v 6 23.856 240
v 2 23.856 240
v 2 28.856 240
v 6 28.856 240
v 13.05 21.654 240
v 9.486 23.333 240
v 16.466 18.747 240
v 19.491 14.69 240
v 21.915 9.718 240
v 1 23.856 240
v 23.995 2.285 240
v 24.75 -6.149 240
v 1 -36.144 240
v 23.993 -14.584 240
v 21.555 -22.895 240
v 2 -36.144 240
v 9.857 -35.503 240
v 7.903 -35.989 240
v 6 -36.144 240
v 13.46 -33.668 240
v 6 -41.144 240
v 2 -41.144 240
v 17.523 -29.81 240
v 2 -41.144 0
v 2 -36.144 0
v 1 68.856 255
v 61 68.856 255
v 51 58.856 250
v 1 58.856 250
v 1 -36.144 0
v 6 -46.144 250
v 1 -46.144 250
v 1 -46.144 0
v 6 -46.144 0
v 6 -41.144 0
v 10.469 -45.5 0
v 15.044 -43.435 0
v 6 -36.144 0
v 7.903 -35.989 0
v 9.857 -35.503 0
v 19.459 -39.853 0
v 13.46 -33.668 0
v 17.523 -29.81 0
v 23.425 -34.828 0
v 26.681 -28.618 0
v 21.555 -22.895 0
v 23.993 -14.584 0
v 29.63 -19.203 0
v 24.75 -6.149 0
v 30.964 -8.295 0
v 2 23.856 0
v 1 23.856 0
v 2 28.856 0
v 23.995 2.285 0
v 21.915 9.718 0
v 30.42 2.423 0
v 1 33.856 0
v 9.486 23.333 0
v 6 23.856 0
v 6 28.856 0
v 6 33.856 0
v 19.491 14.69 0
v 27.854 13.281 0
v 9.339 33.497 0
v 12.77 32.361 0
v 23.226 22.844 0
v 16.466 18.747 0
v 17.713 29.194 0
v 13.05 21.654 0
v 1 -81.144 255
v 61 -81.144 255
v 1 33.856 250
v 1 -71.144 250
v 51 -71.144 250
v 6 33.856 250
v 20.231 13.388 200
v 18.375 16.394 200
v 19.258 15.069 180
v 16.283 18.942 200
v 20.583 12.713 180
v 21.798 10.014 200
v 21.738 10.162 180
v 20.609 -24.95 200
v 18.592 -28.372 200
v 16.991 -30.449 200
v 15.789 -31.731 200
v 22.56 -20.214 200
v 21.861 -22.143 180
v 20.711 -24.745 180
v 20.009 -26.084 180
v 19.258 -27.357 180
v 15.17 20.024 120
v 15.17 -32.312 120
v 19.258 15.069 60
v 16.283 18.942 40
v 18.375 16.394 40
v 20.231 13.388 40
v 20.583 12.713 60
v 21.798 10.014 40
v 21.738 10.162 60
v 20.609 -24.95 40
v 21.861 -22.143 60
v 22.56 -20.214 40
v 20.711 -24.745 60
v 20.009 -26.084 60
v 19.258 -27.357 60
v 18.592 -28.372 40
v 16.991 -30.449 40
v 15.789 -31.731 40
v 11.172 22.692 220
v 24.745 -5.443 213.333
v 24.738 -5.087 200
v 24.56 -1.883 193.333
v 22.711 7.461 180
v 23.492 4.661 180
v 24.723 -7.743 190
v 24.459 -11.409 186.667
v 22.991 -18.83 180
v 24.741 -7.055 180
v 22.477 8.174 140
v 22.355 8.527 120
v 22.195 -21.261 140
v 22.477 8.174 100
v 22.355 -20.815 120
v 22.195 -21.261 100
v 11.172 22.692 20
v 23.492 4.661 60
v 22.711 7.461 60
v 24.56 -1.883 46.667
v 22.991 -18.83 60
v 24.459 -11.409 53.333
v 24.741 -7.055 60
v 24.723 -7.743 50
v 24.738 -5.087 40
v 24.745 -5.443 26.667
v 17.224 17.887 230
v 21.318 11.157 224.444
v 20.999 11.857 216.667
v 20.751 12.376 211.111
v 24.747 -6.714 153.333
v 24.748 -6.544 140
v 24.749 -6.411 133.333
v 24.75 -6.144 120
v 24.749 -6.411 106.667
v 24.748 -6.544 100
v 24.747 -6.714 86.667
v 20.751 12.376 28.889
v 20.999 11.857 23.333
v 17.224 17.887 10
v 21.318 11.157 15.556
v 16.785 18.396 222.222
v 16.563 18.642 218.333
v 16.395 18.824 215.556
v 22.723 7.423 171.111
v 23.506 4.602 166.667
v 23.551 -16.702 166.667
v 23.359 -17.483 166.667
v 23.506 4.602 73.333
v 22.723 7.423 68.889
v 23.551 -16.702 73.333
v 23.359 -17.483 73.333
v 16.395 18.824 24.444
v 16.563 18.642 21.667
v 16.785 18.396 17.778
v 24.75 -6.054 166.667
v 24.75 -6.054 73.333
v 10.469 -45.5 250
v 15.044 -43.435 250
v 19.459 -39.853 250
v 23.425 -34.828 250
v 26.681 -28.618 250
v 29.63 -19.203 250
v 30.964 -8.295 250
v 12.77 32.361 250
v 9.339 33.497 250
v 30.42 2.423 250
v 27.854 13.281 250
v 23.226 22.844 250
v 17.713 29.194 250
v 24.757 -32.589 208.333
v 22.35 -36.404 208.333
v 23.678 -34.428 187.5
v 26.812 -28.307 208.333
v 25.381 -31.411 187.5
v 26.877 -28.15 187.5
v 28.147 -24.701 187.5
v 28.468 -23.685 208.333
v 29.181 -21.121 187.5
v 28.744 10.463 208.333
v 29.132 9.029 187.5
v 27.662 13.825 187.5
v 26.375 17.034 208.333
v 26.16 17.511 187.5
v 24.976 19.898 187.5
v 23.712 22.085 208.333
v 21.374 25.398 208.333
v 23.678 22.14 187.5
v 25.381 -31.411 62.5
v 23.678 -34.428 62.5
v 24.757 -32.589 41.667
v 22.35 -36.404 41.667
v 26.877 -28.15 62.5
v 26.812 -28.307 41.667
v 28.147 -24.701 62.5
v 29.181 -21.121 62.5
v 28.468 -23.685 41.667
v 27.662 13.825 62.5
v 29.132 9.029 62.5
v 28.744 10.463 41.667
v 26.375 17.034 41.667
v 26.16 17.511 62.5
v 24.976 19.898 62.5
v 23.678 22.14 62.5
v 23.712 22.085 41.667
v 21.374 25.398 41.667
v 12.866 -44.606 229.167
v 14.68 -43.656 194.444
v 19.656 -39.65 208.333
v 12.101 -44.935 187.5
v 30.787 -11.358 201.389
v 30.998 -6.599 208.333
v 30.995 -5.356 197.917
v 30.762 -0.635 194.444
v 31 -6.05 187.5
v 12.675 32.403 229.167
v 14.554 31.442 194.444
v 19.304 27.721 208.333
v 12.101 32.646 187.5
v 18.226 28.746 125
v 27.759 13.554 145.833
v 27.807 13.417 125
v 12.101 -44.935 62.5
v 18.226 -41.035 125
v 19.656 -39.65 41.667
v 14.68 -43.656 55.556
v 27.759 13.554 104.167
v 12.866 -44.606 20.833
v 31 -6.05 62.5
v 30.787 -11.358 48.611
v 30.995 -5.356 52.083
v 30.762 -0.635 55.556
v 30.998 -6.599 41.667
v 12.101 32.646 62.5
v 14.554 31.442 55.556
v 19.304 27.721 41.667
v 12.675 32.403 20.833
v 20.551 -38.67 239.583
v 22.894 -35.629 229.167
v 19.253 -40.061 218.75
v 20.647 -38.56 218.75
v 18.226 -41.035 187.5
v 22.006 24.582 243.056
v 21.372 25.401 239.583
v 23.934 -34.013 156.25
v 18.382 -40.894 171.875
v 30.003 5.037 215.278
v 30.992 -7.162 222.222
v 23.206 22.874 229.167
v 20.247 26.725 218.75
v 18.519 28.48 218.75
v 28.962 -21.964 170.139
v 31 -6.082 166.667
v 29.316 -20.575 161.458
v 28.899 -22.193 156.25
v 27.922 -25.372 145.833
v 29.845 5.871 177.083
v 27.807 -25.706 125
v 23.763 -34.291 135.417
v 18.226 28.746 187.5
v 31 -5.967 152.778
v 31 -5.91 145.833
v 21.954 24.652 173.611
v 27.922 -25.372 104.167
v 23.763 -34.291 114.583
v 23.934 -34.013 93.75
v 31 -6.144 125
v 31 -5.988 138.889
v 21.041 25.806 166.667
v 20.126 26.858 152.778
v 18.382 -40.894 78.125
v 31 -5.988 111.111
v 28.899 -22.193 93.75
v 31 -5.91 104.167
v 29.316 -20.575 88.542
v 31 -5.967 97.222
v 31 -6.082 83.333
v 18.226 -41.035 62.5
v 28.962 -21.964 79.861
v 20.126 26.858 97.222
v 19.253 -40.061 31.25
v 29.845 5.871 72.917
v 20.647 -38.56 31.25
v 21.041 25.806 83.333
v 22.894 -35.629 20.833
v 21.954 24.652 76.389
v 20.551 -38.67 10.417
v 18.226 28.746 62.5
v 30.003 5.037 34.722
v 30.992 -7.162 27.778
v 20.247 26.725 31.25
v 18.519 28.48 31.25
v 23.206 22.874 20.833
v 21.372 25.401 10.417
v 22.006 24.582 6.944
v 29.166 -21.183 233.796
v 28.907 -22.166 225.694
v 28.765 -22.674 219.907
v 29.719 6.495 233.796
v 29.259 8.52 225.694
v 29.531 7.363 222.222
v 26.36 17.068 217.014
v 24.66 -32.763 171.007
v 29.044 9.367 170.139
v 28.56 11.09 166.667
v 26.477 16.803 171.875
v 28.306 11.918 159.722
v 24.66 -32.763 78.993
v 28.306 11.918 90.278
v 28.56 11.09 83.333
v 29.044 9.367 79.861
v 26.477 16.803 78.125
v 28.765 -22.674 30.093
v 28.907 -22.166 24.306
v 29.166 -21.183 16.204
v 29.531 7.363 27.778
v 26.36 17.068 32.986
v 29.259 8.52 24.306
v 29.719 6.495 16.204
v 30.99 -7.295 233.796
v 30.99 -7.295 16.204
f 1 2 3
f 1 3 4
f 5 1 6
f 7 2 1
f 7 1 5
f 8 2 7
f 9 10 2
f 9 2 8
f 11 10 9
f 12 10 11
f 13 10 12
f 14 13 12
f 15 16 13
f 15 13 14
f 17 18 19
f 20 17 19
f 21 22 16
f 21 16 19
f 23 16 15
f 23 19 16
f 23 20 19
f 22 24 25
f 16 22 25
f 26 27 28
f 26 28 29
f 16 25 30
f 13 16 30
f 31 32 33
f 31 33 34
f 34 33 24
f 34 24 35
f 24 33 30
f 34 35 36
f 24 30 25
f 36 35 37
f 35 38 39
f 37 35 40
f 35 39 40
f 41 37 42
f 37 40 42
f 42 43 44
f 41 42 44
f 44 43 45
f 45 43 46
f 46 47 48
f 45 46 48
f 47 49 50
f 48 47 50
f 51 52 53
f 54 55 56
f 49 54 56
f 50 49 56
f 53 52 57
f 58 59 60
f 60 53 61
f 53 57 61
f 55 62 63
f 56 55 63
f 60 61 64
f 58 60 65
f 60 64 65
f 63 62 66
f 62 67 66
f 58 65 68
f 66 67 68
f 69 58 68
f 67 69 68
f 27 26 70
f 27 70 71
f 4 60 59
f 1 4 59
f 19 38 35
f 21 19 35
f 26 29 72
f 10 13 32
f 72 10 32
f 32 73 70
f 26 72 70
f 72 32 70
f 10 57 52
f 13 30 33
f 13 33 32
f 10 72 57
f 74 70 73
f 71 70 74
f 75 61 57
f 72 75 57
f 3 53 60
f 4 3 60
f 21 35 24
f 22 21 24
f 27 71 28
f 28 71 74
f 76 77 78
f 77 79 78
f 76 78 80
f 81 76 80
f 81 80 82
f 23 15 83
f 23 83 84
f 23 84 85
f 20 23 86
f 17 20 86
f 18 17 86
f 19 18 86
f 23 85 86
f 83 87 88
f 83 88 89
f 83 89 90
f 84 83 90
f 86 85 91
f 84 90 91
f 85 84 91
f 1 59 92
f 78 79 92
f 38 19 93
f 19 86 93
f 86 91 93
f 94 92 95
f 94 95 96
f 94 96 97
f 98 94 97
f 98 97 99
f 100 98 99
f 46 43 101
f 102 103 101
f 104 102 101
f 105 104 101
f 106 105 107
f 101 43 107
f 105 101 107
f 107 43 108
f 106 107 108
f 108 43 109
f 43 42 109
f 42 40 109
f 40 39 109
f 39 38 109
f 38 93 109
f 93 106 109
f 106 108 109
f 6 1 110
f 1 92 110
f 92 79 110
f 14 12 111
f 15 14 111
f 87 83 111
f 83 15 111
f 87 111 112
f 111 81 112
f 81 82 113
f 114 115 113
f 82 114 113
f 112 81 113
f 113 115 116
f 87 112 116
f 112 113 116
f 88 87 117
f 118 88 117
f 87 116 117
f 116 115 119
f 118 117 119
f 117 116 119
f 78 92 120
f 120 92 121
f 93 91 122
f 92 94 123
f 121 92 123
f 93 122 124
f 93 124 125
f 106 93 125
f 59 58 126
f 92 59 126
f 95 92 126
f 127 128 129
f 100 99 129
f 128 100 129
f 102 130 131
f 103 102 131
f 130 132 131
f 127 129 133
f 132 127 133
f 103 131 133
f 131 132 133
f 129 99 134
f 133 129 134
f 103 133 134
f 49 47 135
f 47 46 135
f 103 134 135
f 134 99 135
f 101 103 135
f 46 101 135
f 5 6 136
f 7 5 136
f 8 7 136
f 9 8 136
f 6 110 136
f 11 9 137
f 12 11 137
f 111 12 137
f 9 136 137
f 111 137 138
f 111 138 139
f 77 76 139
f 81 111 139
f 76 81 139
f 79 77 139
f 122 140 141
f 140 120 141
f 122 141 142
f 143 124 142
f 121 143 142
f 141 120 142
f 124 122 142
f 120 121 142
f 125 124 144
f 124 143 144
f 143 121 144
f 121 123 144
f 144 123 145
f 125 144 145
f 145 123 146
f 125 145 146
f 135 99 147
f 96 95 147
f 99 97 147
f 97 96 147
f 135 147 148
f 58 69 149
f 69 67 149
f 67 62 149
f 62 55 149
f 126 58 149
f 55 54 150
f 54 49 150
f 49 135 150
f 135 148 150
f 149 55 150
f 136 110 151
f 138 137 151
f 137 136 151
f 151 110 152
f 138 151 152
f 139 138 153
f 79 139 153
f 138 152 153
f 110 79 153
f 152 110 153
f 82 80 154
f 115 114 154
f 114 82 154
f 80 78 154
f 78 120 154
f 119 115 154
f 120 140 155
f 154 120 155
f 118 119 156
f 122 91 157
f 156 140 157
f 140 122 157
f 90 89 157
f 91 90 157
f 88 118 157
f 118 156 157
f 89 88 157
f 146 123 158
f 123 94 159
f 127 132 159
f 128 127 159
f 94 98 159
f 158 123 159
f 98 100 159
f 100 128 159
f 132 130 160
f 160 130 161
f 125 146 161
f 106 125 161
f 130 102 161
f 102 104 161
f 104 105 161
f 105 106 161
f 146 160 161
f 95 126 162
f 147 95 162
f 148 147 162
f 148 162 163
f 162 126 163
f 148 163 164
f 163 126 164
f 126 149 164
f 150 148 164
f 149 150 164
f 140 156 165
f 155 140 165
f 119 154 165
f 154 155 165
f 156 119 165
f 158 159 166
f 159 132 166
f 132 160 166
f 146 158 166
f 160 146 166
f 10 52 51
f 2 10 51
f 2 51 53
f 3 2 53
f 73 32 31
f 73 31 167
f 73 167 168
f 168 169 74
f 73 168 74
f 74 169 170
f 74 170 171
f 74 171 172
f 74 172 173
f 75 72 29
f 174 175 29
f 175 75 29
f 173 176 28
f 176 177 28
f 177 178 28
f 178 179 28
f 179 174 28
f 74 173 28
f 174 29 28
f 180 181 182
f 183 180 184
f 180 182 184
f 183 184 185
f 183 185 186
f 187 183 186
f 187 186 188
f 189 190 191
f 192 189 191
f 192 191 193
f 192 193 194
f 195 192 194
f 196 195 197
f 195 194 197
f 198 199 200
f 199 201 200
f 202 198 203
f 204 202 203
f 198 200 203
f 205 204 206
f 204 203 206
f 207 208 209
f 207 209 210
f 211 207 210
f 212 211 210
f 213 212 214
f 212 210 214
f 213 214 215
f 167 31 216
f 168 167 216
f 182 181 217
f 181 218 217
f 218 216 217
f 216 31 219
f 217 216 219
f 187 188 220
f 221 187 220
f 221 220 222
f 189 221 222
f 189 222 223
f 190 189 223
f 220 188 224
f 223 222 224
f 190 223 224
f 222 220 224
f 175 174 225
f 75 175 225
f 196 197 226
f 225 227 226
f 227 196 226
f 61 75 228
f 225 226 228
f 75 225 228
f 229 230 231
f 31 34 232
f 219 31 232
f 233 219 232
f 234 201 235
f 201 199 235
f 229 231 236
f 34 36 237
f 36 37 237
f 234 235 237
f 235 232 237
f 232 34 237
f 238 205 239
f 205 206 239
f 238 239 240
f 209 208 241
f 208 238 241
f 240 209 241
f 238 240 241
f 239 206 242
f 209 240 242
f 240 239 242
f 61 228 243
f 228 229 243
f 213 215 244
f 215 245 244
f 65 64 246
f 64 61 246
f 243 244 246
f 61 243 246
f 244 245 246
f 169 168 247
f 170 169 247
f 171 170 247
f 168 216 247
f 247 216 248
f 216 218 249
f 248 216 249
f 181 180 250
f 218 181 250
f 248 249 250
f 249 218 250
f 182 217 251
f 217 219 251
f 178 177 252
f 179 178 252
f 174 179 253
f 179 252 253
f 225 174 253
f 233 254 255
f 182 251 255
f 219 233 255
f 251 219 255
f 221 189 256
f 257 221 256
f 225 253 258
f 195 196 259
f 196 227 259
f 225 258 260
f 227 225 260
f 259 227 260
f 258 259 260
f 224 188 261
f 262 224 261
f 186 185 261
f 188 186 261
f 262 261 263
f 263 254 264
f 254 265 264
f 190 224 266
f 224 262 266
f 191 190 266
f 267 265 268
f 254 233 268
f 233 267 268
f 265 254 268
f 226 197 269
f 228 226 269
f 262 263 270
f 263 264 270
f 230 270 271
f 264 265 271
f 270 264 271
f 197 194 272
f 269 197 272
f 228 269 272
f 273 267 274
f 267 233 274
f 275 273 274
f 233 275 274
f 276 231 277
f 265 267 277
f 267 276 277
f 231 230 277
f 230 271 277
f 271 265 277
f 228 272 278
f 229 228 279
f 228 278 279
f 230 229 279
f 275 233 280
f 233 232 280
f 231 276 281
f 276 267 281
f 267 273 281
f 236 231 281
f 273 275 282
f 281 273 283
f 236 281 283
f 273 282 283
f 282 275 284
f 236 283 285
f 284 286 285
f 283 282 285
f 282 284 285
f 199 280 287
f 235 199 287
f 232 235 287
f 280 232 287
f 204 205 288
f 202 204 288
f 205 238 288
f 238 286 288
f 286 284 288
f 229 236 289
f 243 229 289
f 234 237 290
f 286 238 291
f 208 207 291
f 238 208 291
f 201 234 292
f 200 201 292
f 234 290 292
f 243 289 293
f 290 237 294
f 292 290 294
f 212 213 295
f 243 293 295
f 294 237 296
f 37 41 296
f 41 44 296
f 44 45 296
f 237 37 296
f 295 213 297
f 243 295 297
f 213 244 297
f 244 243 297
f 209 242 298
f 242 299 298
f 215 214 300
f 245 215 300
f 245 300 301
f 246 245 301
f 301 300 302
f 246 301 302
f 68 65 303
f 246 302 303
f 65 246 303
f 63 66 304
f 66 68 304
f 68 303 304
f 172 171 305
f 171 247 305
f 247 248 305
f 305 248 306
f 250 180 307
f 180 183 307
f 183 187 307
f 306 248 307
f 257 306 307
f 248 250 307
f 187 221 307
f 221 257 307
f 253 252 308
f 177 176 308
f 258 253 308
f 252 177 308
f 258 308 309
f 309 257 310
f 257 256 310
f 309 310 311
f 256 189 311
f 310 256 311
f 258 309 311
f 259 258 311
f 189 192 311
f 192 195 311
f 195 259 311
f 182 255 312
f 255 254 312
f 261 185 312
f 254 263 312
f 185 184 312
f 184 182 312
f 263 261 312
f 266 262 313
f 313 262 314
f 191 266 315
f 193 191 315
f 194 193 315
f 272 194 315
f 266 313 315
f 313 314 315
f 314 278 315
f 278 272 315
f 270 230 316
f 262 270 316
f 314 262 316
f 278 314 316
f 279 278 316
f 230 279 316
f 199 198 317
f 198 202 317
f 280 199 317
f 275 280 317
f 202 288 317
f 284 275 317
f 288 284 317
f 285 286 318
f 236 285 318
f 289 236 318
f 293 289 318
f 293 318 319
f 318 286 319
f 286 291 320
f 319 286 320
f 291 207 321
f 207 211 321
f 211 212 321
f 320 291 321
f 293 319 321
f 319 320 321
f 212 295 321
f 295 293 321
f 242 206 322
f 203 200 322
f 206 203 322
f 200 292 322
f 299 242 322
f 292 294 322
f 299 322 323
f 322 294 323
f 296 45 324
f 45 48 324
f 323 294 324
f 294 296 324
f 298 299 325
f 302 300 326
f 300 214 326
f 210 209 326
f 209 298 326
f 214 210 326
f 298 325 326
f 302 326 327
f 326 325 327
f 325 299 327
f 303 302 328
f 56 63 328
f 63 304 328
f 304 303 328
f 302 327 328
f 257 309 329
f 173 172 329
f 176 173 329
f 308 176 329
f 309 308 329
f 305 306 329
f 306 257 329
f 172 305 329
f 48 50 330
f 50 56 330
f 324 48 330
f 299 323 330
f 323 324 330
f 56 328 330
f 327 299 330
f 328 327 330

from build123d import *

# Parameters (mm, degrees)
F1_DEPTH = 250
F3_DEPTH = 5
F4_SIZE2 = 4.99999
F4_SIZE  = 9.99999
F6_DEPTH = 240


# Not quite as in the source:
# - a fillet or chamfer is up to 0.001 mm smaller than in the source, because OpenCascade refuses the exact size
# - a feature names something its author has since deleted; it is built from what else it names


with BuildPart() as f1:
    # F0 (on Top) → F1 (new body)
    with BuildSketch(Plane.XY):
        with BuildLine():
            Line((1.0000000522, -46.1442264915), (6.0000000522, -46.1442264915))
            add(Edge.make_bspline(
                [(6, -46.1442264915), (31, -46.1442264915), (31, -6.1442264915), (31, 33.8557735085), (6, 33.8557735085)],
                knots=[0, 0, 0, 1.5707963268, 1.5707963268, 3.1415926536, 3.1415926536, 3.1415926536], degree=2, weights=[1, 0.7071067812, 1, 0.7071067812, 1]))
            Line((6.0000000522, 33.8557735085), (1.0000000522, 33.8557735085))
            Line((1.0000000522, 33.8557735085), (1.0000000522, -46.1442264915))
        make_face()
    extrude(amount=F1_DEPTH)

    # F2 (on face) → F3 (join)
    with BuildSketch(Plane.XY.offset(250)):
        with BuildLine():
            Line((61.0000000522, -81.1442264915), (61.0000000522, 68.8557735085))
            Line((61.0000000522, 68.8557735085), (1.0000000522, 68.8557735085))
            Line((1.0000000522, 68.8557735085), (1.0000000522, 33.8557735085))
            Line((1.0000000522, 33.8557735085), (6.0000000522, 33.8557735085))
            add(Edge.make_bspline(
                [(6, -46.1442264915), (31, -46.1442264915), (31, -6.1442264915), (31, 33.8557735085), (6, 33.8557735085)],
                knots=[0, 0, 0, 1.5707963268, 1.5707963268, 3.1415926536, 3.1415926536, 3.1415926536], degree=2, weights=[1, 0.7071067812, 1, 0.7071067812, 1]))
            Line((6.0000000522, -46.1442264915), (1.0000000522, -46.1442264915))
            Line((1.0000000522, -46.1442264915), (1.0000000522, -81.1442264915))
            Line((1.0000000522, -81.1442264915), (61.0000000522, -81.1442264915))
        make_face()
        with BuildLine():
            Line((6.0000000522, 33.8557735085), (1.0000000522, 33.8557735085))
            Line((1.0000000522, 33.8557735085), (1.0000000522, -46.1442264915))
            Line((1.0000000522, -46.1442264915), (6.0000000522, -46.1442264915))
            add(Edge.make_bspline(
                [(6, -46.1442264915), (31, -46.1442264915), (31, -6.1442264915), (31, 33.8557735085), (6, 33.8557735085)],
                knots=[0, 0, 0, 1.5707963268, 1.5707963268, 3.1415926536, 3.1415926536, 3.1415926536], degree=2, weights=[1, 0.7071067812, 1, 0.7071067812, 1]))
        make_face()
    extrude(amount=F3_DEPTH)

    # F4 (size 10 and 5 in the source; OpenCascade refuses exactly that, so slightly less here)
    f4_edges = [f1.edges().sort_by_distance(p)[0] for p in [
        (31, 68.855774, 250),
        (61, -6.144226, 250),
        (31, -81.144226, 250),
    ]]
    f4_side = f1.faces().sort_by_distance((35.795895, -6.144226, 250))[0]
    chamfer(f4_edges, length=F4_SIZE, length2=F4_SIZE2, reference=f4_side)

    # F5 (on face) → F6 (cut)
    with BuildSketch(Plane(origin=(0, 0, 0), x_dir=(1, 0, 0), z_dir=(0, 0, -1))):
        with BuildLine():
            Line((3.5000000522, -23.8557735085), (6.0000000522, -23.8557735085))
            add(Edge.make_bspline(
                [(6, -23.8557735085), (24.75, -23.8557735085), (24.75, 6.1442264915), (24.75, 36.1442264915), (6, 36.1442264915)],
                knots=[0, 0, 0, 1.5707963268, 1.5707963268, 3.1415926536, 3.1415926536, 3.1415926536], degree=2, weights=[1, 0.7071067812, 1, 0.7071067812, 1]))
            Line((6.0000000522, 36.1442264915), (3.5000000522, 36.1442264915))
            Line((3.5000000522, 36.1442264915), (2.0000000522, 36.1442264915))
            Line((2.0000000522, 36.1442264915), (1.0000000522, 36.1442264915))
            Line((1.0000000522, 36.1442264915), (1.0000000522, 6.1442264915))
            Line((1.0000000522, 6.1442264915), (1.0000000522, -23.8557735085))
            Line((1.0000000522, -23.8557735085), (2.0000000522, -23.8557735085))
            Line((2.0000000522, -23.8557735085), (3.5000000522, -23.8557735085))
        make_face()
        Polygon((6.0000000522, -28.8557735085), (6.0000000522, -23.8557735085), (3.5000000522, -23.8557735085), (2.0000000522, -23.8557735085), (2.0000000522, -28.8557735085), align=None)
        Polygon((3.5000000522, 36.1442264915), (6.0000000522, 36.1442264915), (6.0000000522, 41.1442264915), (2.0000000522, 41.1442264915), (2.0000000522, 36.1442264915), align=None)
    extrude(amount=-F6_DEPTH, mode=Mode.SUBTRACT)


solid = f1.part
